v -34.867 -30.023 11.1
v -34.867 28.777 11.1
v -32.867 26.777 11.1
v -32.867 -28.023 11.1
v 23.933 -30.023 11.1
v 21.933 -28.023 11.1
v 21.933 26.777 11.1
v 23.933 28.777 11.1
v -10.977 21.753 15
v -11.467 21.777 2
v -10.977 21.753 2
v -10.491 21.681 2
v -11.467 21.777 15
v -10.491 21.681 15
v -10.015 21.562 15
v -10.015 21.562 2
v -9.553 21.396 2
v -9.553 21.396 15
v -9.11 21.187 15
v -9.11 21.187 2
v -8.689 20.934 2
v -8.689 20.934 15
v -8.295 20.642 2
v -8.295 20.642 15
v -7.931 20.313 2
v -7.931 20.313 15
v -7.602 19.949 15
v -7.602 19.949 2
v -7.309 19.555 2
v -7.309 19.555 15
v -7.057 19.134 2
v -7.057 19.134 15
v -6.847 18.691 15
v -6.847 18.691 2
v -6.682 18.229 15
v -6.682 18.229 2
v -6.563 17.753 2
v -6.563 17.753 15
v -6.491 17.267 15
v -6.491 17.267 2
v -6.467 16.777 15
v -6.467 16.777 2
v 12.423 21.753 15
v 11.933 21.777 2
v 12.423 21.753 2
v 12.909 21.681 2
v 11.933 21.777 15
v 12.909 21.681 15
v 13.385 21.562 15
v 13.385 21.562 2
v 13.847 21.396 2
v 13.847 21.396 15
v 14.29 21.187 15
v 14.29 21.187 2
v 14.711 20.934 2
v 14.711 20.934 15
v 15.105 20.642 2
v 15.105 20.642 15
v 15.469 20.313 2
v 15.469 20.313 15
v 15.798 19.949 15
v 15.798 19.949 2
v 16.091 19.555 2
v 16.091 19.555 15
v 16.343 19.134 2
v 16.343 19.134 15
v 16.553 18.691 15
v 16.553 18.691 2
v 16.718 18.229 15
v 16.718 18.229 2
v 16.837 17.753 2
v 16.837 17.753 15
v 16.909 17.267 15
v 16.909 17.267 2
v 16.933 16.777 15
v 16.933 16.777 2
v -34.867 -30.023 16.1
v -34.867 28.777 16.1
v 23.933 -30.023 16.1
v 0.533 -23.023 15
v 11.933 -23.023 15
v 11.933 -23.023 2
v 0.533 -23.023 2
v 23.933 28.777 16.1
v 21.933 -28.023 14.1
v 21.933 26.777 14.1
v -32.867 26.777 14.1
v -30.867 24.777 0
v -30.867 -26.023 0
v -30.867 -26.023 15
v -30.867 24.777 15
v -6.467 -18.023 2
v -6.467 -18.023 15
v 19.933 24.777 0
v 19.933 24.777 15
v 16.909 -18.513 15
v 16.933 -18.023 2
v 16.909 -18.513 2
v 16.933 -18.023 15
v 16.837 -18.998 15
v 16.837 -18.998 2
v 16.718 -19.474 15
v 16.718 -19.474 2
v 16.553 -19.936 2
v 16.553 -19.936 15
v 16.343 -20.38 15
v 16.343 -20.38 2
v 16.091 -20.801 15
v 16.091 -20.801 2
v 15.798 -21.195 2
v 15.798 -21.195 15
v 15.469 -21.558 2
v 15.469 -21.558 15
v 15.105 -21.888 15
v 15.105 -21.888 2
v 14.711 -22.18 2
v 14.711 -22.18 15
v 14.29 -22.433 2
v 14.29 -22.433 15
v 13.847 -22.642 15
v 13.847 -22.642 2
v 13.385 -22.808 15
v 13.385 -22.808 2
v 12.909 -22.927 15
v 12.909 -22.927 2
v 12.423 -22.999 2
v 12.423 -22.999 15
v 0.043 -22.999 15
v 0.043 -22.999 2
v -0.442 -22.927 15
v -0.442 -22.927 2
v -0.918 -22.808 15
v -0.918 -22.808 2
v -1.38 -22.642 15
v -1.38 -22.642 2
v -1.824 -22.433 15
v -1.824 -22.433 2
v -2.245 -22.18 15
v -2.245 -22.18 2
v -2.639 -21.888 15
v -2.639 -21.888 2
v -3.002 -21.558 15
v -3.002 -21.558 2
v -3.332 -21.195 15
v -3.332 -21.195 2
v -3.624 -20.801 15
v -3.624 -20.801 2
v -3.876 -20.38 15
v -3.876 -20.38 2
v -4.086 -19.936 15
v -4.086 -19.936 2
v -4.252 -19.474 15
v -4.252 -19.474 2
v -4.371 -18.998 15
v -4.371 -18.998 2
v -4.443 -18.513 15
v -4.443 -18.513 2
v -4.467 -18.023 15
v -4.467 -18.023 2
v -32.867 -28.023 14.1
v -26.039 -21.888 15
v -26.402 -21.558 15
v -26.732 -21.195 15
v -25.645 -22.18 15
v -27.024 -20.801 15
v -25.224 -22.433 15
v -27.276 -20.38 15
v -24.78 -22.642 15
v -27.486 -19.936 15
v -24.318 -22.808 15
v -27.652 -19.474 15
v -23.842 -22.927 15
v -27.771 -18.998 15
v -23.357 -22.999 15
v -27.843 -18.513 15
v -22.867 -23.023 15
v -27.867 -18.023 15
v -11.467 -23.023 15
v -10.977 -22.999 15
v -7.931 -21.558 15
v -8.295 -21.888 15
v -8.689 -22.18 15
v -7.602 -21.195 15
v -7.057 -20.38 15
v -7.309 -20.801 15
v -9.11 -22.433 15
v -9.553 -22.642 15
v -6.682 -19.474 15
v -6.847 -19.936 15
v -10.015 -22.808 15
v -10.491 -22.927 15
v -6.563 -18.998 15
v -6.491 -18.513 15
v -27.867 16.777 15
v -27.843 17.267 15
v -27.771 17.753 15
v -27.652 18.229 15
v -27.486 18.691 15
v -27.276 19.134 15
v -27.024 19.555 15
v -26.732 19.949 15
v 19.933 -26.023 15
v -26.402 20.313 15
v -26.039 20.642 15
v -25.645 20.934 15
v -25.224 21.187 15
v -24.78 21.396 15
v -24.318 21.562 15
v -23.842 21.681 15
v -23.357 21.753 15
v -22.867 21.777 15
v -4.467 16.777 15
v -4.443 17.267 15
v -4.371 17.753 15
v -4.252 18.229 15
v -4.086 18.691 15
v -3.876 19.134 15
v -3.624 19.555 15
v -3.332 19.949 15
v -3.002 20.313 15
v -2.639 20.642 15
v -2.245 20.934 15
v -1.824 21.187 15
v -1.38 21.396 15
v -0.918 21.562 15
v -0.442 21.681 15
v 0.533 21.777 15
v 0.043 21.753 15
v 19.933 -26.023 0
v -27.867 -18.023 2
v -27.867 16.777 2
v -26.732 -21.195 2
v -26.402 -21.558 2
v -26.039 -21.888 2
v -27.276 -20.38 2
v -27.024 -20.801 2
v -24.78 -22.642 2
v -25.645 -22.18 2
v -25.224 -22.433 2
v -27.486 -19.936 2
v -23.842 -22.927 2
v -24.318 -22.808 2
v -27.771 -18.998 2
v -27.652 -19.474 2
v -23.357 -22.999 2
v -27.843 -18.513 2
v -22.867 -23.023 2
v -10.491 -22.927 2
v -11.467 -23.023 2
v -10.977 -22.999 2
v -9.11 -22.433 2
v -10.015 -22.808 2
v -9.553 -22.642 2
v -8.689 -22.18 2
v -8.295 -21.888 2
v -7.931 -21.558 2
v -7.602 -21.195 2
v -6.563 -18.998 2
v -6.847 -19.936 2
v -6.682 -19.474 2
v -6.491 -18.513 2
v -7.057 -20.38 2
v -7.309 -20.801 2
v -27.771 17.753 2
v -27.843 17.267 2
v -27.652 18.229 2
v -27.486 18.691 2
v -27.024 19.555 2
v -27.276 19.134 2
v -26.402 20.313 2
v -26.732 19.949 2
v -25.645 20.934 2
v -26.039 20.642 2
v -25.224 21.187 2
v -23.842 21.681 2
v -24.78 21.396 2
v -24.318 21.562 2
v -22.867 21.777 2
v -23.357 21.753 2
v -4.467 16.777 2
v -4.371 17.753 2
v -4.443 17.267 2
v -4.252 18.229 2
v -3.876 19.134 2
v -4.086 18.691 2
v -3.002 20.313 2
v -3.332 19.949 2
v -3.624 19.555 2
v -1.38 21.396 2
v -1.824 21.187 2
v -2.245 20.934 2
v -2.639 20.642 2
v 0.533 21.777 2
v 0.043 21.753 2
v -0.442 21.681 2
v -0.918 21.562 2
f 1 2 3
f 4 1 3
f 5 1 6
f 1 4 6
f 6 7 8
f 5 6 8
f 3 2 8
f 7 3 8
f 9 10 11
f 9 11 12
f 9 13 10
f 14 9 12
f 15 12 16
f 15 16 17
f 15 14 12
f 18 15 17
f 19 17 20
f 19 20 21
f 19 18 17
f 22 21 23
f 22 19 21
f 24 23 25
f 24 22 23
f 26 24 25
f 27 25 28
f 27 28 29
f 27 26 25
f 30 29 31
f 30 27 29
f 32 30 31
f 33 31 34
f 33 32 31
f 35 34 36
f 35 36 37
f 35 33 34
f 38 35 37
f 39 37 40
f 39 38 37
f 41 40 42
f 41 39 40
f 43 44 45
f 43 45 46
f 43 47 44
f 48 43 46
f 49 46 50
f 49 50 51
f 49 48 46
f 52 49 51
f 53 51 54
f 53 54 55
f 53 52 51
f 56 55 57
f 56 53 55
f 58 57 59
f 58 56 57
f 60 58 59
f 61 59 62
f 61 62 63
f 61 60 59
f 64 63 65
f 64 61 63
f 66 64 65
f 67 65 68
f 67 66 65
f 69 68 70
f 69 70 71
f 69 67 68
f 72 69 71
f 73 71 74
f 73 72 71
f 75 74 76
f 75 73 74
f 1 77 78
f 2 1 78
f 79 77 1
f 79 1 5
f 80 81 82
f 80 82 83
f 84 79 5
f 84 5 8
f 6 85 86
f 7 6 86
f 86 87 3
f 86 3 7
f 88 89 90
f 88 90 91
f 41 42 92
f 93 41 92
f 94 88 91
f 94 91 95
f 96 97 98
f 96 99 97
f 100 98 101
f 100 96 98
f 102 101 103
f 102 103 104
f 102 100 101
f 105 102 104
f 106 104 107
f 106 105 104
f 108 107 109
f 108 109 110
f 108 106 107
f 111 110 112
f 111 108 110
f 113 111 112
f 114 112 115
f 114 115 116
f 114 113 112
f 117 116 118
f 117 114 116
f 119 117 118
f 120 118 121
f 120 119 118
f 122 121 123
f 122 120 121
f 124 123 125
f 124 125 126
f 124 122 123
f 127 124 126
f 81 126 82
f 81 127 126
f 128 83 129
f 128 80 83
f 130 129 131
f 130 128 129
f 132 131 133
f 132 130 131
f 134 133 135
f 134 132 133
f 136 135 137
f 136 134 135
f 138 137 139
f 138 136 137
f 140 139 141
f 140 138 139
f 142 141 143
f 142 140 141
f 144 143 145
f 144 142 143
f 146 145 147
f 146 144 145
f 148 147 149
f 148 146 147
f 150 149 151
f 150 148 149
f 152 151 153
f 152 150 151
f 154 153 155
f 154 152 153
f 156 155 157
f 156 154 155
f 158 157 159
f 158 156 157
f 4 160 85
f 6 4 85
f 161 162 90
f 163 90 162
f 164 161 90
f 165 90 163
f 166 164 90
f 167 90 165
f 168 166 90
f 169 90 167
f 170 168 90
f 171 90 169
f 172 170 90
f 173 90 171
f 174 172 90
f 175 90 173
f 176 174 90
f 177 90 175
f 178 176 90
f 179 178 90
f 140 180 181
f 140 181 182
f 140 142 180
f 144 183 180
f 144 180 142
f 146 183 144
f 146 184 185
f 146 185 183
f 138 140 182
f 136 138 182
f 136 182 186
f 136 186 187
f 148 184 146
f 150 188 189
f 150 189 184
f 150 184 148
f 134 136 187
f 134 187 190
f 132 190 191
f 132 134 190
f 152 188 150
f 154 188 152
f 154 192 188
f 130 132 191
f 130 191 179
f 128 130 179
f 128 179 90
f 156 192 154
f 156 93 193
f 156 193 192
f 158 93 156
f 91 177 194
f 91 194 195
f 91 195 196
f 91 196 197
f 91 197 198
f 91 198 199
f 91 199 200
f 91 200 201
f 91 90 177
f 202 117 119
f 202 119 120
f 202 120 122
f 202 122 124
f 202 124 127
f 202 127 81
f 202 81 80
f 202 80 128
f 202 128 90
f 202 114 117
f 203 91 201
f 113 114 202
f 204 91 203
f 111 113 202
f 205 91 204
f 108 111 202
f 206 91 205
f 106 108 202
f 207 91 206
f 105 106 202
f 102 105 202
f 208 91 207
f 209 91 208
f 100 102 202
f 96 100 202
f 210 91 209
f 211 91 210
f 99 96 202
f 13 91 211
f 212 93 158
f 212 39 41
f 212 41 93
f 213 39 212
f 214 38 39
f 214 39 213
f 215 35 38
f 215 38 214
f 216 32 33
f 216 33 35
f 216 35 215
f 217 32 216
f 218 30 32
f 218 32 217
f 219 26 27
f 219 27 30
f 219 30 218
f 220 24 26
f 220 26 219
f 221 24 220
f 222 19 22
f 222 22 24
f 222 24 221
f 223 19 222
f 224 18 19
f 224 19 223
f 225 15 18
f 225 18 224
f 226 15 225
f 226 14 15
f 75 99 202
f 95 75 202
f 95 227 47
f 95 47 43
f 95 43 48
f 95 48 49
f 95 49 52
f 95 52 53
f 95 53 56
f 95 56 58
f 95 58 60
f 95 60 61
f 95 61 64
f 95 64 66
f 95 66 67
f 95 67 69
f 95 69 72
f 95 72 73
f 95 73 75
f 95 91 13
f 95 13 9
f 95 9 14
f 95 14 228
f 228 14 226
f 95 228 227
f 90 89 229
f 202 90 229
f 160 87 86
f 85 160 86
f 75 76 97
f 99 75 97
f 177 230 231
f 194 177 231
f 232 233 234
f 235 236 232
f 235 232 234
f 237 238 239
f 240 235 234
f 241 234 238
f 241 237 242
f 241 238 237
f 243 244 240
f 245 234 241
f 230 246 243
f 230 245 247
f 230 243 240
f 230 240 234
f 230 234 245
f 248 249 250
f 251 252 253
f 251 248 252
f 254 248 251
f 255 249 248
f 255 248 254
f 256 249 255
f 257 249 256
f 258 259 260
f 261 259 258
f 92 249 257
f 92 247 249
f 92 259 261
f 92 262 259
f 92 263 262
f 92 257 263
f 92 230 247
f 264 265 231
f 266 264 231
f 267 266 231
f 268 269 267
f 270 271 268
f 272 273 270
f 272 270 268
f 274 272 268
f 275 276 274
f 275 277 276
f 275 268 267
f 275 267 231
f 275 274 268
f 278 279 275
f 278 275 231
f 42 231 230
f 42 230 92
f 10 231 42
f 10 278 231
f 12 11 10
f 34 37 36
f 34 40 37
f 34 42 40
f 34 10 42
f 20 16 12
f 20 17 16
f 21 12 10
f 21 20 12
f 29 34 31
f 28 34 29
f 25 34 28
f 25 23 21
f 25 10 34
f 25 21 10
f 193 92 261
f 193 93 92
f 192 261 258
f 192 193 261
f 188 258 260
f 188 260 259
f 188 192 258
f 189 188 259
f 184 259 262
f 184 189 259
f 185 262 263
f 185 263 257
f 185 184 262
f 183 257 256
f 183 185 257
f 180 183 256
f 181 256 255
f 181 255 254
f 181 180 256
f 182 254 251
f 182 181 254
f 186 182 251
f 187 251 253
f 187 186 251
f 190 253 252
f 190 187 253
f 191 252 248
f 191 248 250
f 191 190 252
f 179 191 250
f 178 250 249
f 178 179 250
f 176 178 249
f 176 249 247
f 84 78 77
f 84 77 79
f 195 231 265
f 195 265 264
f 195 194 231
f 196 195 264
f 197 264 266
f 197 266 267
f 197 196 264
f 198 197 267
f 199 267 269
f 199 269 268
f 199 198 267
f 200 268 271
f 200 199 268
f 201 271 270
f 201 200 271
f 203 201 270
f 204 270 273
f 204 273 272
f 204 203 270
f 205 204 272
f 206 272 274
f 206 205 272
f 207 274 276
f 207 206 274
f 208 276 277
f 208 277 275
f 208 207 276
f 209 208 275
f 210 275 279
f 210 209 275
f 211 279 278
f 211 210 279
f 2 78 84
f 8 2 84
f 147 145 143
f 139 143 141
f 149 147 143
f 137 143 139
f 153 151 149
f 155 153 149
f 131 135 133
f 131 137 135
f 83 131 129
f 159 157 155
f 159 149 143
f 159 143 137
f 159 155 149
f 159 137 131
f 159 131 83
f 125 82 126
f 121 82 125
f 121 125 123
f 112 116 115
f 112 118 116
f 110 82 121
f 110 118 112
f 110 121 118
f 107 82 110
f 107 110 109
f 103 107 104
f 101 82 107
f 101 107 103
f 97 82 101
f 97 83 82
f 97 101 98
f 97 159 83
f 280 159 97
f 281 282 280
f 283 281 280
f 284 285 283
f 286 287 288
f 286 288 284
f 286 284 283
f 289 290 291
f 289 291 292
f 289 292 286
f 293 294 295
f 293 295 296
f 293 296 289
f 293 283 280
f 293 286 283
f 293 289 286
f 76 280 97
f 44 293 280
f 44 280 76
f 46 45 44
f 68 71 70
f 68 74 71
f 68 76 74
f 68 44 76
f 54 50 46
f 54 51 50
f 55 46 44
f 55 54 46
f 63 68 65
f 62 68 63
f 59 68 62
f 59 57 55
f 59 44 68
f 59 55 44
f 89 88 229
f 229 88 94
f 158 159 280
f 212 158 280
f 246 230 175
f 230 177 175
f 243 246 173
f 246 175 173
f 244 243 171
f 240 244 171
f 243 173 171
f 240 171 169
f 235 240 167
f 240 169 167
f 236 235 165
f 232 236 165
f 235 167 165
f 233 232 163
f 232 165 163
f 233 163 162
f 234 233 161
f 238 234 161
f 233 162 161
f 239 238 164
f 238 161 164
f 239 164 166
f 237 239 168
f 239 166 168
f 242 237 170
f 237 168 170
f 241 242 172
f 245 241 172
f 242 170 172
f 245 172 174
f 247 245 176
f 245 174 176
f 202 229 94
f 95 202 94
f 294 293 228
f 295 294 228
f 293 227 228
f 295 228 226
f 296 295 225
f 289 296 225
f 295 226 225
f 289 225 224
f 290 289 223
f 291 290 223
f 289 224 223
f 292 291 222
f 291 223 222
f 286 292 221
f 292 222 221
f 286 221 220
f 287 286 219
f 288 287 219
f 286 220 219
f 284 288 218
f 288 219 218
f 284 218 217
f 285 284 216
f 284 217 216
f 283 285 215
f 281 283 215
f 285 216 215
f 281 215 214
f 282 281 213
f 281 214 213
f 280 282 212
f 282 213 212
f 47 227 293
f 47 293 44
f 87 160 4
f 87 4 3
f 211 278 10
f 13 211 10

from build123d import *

# Parameters (mm, degrees)
F0_W     = 50.8
F0_H     = 50.8
F0_W_2   = 1
F0_H_2   = 8.95
F0_H_3   = 3
F1_DEPTH = 15
F2_DEPTH = 2
F3_R     = 5
F5_W     = 58.8
F5_H     = 58.8
F5_W_2   = 54.8
F5_H_2   = 54.8
F6_DEPTH = 5
F5_W_3   = 50.8
F5_H_3   = 50.8
F7_DEPTH = 2


with BuildPart() as f1:
    # F0 (on Top) → F1 (new body)
    with BuildSketch(Plane.XY):
        with Locations((-5.4668284297, -0.6229165018)):
            Rectangle(F0_W, F0_H)
        Polygon((-27.8668284297, 12.8270834982), (-27.8668284297, 21.7770834982), (-6.4668284297, 21.7770834982), (-5.4668284297, 21.7770834982), (-4.4668284297, 21.7770834982), (16.9331715703, 21.7770834982), (16.9331715703, 12.8270834982), (16.9331715703, 9.8270834982), (16.9331715703, 0.8770834982), (16.9331715703, -2.1229165018), (16.9331715703, -11.0729165018), (16.9331715703, -14.0729165018), (16.9331715703, -23.0229165018), (-4.4668284297, -23.0229165018), (-5.4668284297, -23.0229165018), (-6.4668284297, -23.0229165018), (-27.8668284297, -23.0229165018), (-27.8668284297, -14.0729165018), (-27.8668284297, -11.0729165018), (-27.8668284297, -2.1229165018), (-27.8668284297, 0.8770834982), (-27.8668284297, 9.8270834982), align=None, mode=Mode.SUBTRACT)
        with Locations((-5.9668284297, -6.5979165018)):
            Rectangle(F0_W_2, F0_H_2)
        with Locations((-4.9668284297, -6.5979165018)):
            Rectangle(F0_W_2, F0_H_2)
        with Locations((-5.9668284297, -12.5729165018)):
            Rectangle(F0_W_2, F0_H_3)
        with Locations((-4.9668284297, -12.5729165018)):
            Rectangle(F0_W_2, F0_H_3)
        with Locations((-5.9668284297, -18.5479165018)):
            Rectangle(F0_W_2, F0_H_2)
        with Locations((-4.9668284297, -18.5479165018)):
            Rectangle(F0_W_2, F0_H_2)
        with Locations((-5.9668284297, -0.6229165018)):
            Rectangle(F0_W_2, F0_H_3)
        with Locations((-4.9668284297, -0.6229165018)):
            Rectangle(F0_W_2, F0_H_3)
        with Locations((-5.9668284297, 5.3520834982)):
            Rectangle(F0_W_2, F0_H_2)
        with Locations((-4.9668284297, 5.3520834982)):
            Rectangle(F0_W_2, F0_H_2)
        with Locations((-5.9668284297, 17.3020834982)):
            Rectangle(F0_W_2, F0_H_2)
        with Locations((-4.9668284297, 17.3020834982)):
            Rectangle(F0_W_2, F0_H_2)
        with Locations((-5.9668284297, 11.3270834982)):
            Rectangle(F0_W_2, F0_H_3)
        with Locations((-4.9668284297, 11.3270834982)):
            Rectangle(F0_W_2, F0_H_3)
    extrude(amount=F1_DEPTH)

    # F0 (on Top) → F2 (join)
    with BuildSketch(Plane.XY):
        Polygon((-6.4668284297, 21.7770834982), (-27.8668284297, 21.7770834982), (-27.8668284297, 12.8270834982), (-27.8668284297, 9.8270834982), (-27.8668284297, 0.8770834982), (-27.8668284297, -2.1229165018), (-27.8668284297, -11.0729165018), (-27.8668284297, -14.0729165018), (-27.8668284297, -23.0229165018), (-6.4668284297, -23.0229165018), (-6.4668284297, -14.0729165018), (-6.4668284297, -11.0729165018), (-6.4668284297, -2.1229165018), (-6.4668284297, 0.8770834982), (-6.4668284297, 9.8270834982), (-6.4668284297, 12.8270834982), align=None)
        Polygon((16.9331715703, 21.7770834982), (-4.4668284297, 21.7770834982), (-4.4668284297, 12.8270834982), (-4.4668284297, 9.8270834982), (-4.4668284297, 0.8770834982), (-4.4668284297, -2.1229165018), (-4.4668284297, -11.0729165018), (-4.4668284297, -14.0729165018), (-4.4668284297, -23.0229165018), (16.9331715703, -23.0229165018), (16.9331715703, -14.0729165018), (16.9331715703, -11.0729165018), (16.9331715703, -2.1229165018), (16.9331715703, 0.8770834982), (16.9331715703, 9.8270834982), (16.9331715703, 12.8270834982), align=None)
    extrude(amount=F2_DEPTH)

    # F3
    f3_edges = [f1.edges().sort_by_distance(p)[0] for p in [
        (-27.866828, -23.022917, 8.5),
        (16.933172, -23.022917, 8.5),
        (-27.866828, 21.777083, 8.5),
        (16.933172, 21.777083, 8.5),
        (-4.466828, 21.777083, 8.5),
        (-6.466828, 21.777083, 8.5),
        (-6.466828, -23.022917, 8.5),
        (-4.466828, -23.022917, 8.5),
    ]]
    fillet(f3_edges, radius=F3_R)


with BuildPart() as f6:
    # F5 (on offset) → F6 (new body)
    with BuildSketch(Plane.XY.offset(16.1)):
        with Locations((-5.4668284297, -0.6229165018)):
            Rectangle(F5_W, F5_H)
        with Locations((-5.4668284297, -0.6229165018)):
            Rectangle(F5_W_2, F5_H_2, mode=Mode.SUBTRACT)
    extrude(amount=-F6_DEPTH)

    # F5 (on offset) → F7 (join)
    with BuildSketch(Plane.XY.offset(16.1)):
        with Locations((-5.4668284297, -0.6229165018)):
            Rectangle(F5_W_2, F5_H_2)
        with Locations((-5.4668284297, -0.6229165018)):
            Rectangle(F5_W_3, F5_H_3, mode=Mode.SUBTRACT)
        with Locations((-5.4668284297, -0.6229165018)):
            Rectangle(F5_W_3, F5_H_3)
    extrude(amount=-F7_DEPTH)


solid = Compound([f1.part, f6.part])
